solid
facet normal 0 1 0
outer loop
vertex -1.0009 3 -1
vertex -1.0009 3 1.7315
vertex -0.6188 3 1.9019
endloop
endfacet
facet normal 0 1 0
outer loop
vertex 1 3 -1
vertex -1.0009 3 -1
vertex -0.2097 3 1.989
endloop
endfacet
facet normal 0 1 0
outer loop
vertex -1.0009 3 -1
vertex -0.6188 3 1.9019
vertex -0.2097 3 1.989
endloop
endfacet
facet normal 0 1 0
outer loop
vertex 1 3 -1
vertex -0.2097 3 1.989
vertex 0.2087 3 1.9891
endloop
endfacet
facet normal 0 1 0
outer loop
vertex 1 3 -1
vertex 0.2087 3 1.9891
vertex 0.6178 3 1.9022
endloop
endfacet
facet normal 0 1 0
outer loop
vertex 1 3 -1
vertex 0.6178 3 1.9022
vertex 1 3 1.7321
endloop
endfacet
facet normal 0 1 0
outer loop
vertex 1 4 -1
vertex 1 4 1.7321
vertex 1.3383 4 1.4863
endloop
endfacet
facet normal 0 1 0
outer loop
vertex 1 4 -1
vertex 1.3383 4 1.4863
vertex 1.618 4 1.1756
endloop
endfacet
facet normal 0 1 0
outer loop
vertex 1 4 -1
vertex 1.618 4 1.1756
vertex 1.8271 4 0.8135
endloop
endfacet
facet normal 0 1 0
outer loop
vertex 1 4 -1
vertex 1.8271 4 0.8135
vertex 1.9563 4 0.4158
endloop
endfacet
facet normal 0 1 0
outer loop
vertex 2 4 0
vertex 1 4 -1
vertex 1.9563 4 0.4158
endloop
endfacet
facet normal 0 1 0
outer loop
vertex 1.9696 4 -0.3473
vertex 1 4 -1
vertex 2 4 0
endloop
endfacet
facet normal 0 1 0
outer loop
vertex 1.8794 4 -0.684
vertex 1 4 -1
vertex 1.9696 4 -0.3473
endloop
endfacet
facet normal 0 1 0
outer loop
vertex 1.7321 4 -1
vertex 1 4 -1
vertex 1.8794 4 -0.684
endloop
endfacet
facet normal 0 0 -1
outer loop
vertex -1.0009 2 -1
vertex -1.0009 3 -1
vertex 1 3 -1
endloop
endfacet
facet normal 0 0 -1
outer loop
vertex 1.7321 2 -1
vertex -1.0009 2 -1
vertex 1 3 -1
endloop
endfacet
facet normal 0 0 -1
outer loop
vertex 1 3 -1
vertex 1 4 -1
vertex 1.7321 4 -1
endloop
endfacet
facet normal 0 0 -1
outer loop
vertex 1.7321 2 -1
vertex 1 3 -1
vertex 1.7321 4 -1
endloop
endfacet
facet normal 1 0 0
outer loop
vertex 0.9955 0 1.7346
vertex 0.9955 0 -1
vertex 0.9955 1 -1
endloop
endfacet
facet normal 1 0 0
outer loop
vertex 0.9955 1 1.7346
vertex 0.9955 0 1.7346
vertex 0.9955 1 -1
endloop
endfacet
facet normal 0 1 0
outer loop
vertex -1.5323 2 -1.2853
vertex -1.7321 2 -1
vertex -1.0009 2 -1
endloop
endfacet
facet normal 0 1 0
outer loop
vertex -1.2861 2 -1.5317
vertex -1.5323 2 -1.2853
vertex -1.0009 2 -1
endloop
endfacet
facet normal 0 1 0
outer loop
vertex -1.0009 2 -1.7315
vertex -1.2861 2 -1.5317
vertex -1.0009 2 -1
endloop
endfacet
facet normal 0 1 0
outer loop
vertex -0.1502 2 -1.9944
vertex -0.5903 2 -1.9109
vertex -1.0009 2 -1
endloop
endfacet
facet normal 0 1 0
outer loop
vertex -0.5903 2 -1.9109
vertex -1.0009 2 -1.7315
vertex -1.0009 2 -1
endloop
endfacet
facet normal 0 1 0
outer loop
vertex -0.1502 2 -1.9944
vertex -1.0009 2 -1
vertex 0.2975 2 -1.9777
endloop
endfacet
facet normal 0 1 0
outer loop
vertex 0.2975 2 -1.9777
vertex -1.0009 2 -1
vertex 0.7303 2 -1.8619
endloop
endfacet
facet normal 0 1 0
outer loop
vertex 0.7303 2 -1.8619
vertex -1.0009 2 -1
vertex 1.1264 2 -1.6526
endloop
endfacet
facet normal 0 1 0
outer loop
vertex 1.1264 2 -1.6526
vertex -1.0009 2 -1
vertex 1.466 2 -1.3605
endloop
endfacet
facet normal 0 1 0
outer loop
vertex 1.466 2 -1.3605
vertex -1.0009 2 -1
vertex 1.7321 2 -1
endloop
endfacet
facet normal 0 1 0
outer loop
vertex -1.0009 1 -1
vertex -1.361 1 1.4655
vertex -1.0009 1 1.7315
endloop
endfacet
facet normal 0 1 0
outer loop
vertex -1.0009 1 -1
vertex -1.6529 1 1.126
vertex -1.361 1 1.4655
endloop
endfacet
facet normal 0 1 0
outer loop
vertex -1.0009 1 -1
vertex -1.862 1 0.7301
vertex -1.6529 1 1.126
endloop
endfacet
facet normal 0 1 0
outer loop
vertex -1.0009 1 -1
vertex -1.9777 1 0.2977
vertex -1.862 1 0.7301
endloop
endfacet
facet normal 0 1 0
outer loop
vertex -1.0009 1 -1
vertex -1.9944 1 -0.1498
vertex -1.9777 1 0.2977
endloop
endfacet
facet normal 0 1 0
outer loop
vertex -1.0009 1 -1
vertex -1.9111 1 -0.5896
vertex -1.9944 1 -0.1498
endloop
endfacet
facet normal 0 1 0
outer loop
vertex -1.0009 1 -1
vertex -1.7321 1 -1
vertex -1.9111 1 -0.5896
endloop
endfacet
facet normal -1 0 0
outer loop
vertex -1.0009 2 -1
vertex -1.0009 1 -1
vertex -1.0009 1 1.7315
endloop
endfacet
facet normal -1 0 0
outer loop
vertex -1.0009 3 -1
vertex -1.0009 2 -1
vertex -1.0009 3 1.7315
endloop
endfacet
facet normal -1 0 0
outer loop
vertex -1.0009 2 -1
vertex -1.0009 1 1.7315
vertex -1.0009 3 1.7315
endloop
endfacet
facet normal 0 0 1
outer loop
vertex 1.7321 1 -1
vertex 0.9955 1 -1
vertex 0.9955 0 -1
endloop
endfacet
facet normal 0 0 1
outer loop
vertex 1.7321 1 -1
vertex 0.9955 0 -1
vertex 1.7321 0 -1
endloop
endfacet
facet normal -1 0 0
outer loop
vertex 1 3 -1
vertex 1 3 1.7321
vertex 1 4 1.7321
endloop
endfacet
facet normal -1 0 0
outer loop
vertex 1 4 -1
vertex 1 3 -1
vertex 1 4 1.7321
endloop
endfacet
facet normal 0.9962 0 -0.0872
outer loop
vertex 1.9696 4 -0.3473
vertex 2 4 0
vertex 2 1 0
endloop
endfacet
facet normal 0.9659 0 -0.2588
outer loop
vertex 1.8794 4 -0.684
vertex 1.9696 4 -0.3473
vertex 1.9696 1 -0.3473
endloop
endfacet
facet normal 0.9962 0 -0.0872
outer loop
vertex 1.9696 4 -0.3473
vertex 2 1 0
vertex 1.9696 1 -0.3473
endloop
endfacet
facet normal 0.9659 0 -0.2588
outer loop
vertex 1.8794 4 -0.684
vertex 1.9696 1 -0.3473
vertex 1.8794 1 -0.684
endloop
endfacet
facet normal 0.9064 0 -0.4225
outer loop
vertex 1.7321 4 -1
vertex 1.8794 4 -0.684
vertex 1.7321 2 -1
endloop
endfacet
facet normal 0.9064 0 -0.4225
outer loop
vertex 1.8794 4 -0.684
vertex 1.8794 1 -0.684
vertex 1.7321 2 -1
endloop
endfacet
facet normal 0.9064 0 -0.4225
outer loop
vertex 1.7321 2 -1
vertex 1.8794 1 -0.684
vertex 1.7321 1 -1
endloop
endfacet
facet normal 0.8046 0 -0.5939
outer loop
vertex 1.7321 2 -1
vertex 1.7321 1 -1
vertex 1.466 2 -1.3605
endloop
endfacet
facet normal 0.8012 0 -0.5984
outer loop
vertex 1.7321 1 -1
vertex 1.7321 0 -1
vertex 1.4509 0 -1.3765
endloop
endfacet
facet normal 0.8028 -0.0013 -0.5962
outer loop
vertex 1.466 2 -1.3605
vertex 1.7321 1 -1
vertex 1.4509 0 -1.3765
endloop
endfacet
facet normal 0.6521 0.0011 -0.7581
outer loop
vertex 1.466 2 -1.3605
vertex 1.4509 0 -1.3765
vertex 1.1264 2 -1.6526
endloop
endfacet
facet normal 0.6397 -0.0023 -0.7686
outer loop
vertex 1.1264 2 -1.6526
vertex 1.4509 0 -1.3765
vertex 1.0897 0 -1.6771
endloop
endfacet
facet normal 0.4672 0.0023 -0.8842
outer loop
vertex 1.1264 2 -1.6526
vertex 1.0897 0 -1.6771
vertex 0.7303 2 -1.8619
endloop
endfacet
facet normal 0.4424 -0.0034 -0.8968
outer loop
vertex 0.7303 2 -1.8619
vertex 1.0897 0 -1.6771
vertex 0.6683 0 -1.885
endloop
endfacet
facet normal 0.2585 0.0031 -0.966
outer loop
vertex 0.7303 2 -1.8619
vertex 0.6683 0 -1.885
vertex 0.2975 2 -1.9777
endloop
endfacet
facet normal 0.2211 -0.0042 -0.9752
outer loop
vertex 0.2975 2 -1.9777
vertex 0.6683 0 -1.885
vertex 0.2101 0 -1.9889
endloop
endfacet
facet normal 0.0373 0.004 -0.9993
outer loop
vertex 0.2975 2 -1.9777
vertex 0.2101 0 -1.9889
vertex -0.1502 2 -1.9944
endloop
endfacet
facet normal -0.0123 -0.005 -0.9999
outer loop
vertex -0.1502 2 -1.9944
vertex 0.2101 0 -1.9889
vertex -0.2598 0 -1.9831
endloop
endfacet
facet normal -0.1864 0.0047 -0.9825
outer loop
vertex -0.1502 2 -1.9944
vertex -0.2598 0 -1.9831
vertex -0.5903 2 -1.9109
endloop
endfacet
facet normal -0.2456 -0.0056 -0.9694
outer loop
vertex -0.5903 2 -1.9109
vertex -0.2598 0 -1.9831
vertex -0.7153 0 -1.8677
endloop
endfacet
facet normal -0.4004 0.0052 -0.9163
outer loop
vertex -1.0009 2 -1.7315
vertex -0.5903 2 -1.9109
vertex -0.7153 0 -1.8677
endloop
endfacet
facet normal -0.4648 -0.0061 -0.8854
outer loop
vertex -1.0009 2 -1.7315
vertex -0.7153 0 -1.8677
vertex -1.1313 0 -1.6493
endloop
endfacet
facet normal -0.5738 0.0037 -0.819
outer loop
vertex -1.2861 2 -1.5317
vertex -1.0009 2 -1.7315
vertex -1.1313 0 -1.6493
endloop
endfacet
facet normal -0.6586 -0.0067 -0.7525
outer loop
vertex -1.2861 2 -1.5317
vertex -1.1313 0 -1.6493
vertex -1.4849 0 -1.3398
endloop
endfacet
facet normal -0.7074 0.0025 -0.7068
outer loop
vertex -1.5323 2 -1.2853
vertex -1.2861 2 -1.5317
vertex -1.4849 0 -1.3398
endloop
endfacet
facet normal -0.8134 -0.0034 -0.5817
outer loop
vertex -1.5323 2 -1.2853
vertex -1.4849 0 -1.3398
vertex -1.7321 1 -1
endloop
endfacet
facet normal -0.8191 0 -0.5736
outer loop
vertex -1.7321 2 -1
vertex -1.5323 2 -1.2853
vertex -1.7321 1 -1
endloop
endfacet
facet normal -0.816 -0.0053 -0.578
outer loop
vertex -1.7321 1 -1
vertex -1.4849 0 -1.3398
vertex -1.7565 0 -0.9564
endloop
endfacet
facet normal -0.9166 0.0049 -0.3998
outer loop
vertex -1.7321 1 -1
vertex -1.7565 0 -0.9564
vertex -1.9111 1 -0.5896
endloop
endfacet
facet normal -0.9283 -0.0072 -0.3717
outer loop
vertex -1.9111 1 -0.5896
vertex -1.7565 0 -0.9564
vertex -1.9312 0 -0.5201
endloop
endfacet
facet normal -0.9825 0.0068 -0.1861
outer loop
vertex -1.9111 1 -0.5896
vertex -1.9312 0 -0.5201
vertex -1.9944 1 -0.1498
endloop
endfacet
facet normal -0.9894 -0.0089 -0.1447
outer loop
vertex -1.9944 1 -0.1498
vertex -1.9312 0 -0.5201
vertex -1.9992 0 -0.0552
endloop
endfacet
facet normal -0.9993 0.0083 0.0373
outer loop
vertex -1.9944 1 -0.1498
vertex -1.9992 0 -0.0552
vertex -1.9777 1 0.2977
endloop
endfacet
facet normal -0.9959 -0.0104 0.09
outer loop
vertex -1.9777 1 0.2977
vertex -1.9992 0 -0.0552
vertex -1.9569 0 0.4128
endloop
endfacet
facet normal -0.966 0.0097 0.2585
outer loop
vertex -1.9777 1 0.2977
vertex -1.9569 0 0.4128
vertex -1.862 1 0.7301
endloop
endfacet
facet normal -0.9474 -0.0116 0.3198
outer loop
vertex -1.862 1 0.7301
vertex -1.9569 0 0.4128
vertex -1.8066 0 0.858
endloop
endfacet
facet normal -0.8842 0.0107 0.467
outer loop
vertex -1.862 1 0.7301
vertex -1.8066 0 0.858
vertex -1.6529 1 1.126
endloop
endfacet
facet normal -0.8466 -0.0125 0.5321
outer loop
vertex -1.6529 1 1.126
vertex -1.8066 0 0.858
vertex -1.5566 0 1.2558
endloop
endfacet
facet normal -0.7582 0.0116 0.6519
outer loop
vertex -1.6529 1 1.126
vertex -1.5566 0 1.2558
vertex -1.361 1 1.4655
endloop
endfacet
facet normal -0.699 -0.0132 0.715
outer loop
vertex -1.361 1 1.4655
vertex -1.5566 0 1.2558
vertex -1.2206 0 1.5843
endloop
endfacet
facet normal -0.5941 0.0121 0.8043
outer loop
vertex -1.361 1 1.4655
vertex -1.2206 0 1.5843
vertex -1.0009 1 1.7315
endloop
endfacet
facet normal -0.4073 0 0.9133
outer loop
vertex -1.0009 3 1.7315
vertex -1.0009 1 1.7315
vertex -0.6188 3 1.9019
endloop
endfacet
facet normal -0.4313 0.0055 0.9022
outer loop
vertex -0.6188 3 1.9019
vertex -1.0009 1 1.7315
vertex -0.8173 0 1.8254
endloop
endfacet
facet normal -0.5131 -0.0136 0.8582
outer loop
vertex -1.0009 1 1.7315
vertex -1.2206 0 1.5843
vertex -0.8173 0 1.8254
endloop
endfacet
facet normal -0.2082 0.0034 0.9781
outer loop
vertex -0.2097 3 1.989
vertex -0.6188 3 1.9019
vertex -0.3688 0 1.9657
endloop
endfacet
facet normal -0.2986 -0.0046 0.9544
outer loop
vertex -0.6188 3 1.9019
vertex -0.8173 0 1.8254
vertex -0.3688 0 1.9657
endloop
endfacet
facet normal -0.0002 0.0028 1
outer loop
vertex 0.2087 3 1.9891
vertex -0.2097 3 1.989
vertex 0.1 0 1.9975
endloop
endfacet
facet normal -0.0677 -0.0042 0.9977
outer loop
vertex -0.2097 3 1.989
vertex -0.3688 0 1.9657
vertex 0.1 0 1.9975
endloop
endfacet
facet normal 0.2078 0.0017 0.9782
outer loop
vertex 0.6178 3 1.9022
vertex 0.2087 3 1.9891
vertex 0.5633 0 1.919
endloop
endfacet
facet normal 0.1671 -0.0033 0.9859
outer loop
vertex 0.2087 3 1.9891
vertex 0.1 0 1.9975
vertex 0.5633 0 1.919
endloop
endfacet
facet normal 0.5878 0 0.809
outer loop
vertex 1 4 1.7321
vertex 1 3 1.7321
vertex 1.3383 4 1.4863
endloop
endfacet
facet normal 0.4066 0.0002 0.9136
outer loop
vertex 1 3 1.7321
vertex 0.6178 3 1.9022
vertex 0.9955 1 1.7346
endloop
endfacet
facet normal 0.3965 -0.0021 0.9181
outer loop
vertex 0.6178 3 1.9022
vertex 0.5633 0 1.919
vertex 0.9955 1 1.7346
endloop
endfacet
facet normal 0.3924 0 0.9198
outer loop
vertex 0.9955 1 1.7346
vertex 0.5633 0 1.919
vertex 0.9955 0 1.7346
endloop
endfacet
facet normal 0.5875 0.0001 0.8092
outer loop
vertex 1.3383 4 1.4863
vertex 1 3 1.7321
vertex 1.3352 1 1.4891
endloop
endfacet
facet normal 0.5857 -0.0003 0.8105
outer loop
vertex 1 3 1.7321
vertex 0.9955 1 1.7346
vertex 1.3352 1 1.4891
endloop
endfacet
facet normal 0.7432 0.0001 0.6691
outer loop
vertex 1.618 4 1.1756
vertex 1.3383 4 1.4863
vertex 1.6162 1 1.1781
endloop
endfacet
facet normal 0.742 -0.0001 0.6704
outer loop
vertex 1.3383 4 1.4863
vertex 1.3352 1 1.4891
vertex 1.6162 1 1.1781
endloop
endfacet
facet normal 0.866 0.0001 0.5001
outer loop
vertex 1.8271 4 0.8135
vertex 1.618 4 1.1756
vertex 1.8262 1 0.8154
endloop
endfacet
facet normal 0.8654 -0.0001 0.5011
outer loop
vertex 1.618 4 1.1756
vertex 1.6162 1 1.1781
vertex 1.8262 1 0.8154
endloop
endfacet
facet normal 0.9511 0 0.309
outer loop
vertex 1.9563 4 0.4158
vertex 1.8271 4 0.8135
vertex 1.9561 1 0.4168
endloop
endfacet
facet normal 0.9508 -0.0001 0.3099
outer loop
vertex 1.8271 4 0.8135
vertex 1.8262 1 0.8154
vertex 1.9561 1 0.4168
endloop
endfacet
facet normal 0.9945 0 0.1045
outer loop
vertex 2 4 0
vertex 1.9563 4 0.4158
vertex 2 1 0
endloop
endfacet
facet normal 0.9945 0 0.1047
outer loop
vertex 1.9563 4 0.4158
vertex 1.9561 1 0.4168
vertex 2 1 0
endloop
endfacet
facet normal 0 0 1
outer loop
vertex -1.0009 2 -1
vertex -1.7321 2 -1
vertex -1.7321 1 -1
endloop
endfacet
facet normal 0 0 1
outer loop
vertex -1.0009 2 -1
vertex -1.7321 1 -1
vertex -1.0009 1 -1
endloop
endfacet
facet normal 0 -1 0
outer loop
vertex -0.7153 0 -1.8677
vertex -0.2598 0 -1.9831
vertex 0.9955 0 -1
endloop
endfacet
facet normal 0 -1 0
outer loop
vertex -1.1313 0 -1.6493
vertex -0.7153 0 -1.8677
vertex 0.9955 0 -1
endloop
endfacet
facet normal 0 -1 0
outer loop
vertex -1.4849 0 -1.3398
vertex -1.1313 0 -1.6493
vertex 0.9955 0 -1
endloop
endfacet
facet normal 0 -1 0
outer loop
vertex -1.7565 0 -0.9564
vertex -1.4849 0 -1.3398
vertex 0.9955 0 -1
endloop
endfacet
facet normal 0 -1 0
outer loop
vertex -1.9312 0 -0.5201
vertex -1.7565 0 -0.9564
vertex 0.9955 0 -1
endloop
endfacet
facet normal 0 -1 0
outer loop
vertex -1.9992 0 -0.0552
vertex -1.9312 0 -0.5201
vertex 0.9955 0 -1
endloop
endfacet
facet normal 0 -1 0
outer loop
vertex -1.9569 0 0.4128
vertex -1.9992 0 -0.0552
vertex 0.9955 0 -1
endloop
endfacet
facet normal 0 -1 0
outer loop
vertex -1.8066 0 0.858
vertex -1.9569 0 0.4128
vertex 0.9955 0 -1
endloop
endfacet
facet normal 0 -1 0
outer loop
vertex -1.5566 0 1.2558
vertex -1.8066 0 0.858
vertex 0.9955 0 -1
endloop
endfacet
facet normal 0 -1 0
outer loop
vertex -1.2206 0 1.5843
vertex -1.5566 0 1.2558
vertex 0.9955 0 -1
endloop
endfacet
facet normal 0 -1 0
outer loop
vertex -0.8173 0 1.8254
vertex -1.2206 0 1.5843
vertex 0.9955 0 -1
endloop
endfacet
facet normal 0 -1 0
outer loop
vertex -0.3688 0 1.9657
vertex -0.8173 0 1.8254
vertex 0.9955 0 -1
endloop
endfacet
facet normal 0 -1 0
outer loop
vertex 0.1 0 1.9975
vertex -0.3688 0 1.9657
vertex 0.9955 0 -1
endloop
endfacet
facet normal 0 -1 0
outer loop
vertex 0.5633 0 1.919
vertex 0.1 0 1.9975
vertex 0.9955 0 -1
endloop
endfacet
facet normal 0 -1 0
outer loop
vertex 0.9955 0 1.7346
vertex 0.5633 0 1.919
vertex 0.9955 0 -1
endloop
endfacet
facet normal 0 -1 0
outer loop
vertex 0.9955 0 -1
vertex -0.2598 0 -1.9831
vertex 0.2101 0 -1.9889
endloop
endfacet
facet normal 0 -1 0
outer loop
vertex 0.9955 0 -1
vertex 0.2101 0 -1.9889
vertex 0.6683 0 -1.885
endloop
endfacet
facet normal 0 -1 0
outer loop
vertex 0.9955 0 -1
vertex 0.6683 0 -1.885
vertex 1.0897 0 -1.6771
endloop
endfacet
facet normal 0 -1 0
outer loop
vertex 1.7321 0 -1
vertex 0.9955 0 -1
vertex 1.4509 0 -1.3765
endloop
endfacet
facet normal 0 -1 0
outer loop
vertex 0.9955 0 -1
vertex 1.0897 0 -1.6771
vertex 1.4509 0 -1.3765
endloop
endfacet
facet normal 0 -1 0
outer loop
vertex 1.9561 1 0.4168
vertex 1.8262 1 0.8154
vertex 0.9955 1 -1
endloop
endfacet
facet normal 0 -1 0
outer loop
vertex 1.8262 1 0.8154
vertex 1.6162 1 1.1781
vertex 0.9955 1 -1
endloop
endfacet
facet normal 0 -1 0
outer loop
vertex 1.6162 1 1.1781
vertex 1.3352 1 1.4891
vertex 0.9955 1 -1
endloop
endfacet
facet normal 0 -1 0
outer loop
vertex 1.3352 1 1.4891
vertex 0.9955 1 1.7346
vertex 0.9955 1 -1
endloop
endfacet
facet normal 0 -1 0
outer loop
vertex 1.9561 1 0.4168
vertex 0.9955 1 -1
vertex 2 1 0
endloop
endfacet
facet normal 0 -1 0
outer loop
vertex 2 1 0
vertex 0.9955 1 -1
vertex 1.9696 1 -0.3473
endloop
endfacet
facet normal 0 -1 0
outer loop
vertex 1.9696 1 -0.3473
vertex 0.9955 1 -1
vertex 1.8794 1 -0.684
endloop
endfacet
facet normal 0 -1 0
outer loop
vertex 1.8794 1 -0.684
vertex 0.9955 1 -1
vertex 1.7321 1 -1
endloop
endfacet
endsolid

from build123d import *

# Parameters (mm, degrees)
SKETCH1_R               = 2
BOSS_EXTRUDE1_DEPTH     = 4
CUT_EXTRUDE1_DEPTH      = 2
CUT_EXTRUDE2_DEPTH      = 2
SKETCH4_W               = 0.999117212
SKETCH4_H               = 1
SKETCH4_W_2             = 1.004498255
CUT_EXTRUDE3_DEPTH      = 2
CUT_EXTRUDE3_DEPTH_BACK = 1


with BuildPart() as part:
    # Sketch1 → Boss-Extrude1 (new body)
    with BuildSketch(Plane(origin=(0, 0, 0), x_dir=(1, 0, 0), z_dir=(0, 1, 0))):
        Circle(SKETCH1_R)
    extrude(amount=BOSS_EXTRUDE1_DEPTH)

    # Sketch2 → Cut-Extrude1 (cut, symmetric)
    with BuildSketch(Plane.XY):
        Polygon((1, 4), (-2, 4), (-2, 2), (-1.000882788, 2), (-1.000882788, 3), (1, 3), align=None)
    extrude(amount=CUT_EXTRUDE1_DEPTH, both=True, mode=Mode.SUBTRACT)

    # Sketch3 → Cut-Extrude2 (cut)
    with BuildSketch(Plane(origin=(0, 4, 0), x_dir=(1, 0, 0), z_dir=(0, 1, 0))):
        with BuildLine():
            Line((-1.732050808, 1), (1.732050808, 1))
            ThreePointArc((1.732050808, 1), (0, 2), (-1.732050808, 1))
        make_face()
    extrude(amount=-CUT_EXTRUDE2_DEPTH, mode=Mode.SUBTRACT)

    # Sketch4 → Cut-Extrude3 (cut, two sides)
    with BuildSketch(Plane.XY) as cut_extrude3_sk:
        with Locations((-1.500441394, 1.5)):
            Rectangle(SKETCH4_W, SKETCH4_H)
        with Locations((1.497750873, 0.5)):
            Rectangle(SKETCH4_W_2, SKETCH4_H)
    extrude(amount=CUT_EXTRUDE3_DEPTH, mode=Mode.SUBTRACT)
    extrude(cut_extrude3_sk.sketch, amount=-CUT_EXTRUDE3_DEPTH_BACK, mode=Mode.SUBTRACT)


solid = part.part
